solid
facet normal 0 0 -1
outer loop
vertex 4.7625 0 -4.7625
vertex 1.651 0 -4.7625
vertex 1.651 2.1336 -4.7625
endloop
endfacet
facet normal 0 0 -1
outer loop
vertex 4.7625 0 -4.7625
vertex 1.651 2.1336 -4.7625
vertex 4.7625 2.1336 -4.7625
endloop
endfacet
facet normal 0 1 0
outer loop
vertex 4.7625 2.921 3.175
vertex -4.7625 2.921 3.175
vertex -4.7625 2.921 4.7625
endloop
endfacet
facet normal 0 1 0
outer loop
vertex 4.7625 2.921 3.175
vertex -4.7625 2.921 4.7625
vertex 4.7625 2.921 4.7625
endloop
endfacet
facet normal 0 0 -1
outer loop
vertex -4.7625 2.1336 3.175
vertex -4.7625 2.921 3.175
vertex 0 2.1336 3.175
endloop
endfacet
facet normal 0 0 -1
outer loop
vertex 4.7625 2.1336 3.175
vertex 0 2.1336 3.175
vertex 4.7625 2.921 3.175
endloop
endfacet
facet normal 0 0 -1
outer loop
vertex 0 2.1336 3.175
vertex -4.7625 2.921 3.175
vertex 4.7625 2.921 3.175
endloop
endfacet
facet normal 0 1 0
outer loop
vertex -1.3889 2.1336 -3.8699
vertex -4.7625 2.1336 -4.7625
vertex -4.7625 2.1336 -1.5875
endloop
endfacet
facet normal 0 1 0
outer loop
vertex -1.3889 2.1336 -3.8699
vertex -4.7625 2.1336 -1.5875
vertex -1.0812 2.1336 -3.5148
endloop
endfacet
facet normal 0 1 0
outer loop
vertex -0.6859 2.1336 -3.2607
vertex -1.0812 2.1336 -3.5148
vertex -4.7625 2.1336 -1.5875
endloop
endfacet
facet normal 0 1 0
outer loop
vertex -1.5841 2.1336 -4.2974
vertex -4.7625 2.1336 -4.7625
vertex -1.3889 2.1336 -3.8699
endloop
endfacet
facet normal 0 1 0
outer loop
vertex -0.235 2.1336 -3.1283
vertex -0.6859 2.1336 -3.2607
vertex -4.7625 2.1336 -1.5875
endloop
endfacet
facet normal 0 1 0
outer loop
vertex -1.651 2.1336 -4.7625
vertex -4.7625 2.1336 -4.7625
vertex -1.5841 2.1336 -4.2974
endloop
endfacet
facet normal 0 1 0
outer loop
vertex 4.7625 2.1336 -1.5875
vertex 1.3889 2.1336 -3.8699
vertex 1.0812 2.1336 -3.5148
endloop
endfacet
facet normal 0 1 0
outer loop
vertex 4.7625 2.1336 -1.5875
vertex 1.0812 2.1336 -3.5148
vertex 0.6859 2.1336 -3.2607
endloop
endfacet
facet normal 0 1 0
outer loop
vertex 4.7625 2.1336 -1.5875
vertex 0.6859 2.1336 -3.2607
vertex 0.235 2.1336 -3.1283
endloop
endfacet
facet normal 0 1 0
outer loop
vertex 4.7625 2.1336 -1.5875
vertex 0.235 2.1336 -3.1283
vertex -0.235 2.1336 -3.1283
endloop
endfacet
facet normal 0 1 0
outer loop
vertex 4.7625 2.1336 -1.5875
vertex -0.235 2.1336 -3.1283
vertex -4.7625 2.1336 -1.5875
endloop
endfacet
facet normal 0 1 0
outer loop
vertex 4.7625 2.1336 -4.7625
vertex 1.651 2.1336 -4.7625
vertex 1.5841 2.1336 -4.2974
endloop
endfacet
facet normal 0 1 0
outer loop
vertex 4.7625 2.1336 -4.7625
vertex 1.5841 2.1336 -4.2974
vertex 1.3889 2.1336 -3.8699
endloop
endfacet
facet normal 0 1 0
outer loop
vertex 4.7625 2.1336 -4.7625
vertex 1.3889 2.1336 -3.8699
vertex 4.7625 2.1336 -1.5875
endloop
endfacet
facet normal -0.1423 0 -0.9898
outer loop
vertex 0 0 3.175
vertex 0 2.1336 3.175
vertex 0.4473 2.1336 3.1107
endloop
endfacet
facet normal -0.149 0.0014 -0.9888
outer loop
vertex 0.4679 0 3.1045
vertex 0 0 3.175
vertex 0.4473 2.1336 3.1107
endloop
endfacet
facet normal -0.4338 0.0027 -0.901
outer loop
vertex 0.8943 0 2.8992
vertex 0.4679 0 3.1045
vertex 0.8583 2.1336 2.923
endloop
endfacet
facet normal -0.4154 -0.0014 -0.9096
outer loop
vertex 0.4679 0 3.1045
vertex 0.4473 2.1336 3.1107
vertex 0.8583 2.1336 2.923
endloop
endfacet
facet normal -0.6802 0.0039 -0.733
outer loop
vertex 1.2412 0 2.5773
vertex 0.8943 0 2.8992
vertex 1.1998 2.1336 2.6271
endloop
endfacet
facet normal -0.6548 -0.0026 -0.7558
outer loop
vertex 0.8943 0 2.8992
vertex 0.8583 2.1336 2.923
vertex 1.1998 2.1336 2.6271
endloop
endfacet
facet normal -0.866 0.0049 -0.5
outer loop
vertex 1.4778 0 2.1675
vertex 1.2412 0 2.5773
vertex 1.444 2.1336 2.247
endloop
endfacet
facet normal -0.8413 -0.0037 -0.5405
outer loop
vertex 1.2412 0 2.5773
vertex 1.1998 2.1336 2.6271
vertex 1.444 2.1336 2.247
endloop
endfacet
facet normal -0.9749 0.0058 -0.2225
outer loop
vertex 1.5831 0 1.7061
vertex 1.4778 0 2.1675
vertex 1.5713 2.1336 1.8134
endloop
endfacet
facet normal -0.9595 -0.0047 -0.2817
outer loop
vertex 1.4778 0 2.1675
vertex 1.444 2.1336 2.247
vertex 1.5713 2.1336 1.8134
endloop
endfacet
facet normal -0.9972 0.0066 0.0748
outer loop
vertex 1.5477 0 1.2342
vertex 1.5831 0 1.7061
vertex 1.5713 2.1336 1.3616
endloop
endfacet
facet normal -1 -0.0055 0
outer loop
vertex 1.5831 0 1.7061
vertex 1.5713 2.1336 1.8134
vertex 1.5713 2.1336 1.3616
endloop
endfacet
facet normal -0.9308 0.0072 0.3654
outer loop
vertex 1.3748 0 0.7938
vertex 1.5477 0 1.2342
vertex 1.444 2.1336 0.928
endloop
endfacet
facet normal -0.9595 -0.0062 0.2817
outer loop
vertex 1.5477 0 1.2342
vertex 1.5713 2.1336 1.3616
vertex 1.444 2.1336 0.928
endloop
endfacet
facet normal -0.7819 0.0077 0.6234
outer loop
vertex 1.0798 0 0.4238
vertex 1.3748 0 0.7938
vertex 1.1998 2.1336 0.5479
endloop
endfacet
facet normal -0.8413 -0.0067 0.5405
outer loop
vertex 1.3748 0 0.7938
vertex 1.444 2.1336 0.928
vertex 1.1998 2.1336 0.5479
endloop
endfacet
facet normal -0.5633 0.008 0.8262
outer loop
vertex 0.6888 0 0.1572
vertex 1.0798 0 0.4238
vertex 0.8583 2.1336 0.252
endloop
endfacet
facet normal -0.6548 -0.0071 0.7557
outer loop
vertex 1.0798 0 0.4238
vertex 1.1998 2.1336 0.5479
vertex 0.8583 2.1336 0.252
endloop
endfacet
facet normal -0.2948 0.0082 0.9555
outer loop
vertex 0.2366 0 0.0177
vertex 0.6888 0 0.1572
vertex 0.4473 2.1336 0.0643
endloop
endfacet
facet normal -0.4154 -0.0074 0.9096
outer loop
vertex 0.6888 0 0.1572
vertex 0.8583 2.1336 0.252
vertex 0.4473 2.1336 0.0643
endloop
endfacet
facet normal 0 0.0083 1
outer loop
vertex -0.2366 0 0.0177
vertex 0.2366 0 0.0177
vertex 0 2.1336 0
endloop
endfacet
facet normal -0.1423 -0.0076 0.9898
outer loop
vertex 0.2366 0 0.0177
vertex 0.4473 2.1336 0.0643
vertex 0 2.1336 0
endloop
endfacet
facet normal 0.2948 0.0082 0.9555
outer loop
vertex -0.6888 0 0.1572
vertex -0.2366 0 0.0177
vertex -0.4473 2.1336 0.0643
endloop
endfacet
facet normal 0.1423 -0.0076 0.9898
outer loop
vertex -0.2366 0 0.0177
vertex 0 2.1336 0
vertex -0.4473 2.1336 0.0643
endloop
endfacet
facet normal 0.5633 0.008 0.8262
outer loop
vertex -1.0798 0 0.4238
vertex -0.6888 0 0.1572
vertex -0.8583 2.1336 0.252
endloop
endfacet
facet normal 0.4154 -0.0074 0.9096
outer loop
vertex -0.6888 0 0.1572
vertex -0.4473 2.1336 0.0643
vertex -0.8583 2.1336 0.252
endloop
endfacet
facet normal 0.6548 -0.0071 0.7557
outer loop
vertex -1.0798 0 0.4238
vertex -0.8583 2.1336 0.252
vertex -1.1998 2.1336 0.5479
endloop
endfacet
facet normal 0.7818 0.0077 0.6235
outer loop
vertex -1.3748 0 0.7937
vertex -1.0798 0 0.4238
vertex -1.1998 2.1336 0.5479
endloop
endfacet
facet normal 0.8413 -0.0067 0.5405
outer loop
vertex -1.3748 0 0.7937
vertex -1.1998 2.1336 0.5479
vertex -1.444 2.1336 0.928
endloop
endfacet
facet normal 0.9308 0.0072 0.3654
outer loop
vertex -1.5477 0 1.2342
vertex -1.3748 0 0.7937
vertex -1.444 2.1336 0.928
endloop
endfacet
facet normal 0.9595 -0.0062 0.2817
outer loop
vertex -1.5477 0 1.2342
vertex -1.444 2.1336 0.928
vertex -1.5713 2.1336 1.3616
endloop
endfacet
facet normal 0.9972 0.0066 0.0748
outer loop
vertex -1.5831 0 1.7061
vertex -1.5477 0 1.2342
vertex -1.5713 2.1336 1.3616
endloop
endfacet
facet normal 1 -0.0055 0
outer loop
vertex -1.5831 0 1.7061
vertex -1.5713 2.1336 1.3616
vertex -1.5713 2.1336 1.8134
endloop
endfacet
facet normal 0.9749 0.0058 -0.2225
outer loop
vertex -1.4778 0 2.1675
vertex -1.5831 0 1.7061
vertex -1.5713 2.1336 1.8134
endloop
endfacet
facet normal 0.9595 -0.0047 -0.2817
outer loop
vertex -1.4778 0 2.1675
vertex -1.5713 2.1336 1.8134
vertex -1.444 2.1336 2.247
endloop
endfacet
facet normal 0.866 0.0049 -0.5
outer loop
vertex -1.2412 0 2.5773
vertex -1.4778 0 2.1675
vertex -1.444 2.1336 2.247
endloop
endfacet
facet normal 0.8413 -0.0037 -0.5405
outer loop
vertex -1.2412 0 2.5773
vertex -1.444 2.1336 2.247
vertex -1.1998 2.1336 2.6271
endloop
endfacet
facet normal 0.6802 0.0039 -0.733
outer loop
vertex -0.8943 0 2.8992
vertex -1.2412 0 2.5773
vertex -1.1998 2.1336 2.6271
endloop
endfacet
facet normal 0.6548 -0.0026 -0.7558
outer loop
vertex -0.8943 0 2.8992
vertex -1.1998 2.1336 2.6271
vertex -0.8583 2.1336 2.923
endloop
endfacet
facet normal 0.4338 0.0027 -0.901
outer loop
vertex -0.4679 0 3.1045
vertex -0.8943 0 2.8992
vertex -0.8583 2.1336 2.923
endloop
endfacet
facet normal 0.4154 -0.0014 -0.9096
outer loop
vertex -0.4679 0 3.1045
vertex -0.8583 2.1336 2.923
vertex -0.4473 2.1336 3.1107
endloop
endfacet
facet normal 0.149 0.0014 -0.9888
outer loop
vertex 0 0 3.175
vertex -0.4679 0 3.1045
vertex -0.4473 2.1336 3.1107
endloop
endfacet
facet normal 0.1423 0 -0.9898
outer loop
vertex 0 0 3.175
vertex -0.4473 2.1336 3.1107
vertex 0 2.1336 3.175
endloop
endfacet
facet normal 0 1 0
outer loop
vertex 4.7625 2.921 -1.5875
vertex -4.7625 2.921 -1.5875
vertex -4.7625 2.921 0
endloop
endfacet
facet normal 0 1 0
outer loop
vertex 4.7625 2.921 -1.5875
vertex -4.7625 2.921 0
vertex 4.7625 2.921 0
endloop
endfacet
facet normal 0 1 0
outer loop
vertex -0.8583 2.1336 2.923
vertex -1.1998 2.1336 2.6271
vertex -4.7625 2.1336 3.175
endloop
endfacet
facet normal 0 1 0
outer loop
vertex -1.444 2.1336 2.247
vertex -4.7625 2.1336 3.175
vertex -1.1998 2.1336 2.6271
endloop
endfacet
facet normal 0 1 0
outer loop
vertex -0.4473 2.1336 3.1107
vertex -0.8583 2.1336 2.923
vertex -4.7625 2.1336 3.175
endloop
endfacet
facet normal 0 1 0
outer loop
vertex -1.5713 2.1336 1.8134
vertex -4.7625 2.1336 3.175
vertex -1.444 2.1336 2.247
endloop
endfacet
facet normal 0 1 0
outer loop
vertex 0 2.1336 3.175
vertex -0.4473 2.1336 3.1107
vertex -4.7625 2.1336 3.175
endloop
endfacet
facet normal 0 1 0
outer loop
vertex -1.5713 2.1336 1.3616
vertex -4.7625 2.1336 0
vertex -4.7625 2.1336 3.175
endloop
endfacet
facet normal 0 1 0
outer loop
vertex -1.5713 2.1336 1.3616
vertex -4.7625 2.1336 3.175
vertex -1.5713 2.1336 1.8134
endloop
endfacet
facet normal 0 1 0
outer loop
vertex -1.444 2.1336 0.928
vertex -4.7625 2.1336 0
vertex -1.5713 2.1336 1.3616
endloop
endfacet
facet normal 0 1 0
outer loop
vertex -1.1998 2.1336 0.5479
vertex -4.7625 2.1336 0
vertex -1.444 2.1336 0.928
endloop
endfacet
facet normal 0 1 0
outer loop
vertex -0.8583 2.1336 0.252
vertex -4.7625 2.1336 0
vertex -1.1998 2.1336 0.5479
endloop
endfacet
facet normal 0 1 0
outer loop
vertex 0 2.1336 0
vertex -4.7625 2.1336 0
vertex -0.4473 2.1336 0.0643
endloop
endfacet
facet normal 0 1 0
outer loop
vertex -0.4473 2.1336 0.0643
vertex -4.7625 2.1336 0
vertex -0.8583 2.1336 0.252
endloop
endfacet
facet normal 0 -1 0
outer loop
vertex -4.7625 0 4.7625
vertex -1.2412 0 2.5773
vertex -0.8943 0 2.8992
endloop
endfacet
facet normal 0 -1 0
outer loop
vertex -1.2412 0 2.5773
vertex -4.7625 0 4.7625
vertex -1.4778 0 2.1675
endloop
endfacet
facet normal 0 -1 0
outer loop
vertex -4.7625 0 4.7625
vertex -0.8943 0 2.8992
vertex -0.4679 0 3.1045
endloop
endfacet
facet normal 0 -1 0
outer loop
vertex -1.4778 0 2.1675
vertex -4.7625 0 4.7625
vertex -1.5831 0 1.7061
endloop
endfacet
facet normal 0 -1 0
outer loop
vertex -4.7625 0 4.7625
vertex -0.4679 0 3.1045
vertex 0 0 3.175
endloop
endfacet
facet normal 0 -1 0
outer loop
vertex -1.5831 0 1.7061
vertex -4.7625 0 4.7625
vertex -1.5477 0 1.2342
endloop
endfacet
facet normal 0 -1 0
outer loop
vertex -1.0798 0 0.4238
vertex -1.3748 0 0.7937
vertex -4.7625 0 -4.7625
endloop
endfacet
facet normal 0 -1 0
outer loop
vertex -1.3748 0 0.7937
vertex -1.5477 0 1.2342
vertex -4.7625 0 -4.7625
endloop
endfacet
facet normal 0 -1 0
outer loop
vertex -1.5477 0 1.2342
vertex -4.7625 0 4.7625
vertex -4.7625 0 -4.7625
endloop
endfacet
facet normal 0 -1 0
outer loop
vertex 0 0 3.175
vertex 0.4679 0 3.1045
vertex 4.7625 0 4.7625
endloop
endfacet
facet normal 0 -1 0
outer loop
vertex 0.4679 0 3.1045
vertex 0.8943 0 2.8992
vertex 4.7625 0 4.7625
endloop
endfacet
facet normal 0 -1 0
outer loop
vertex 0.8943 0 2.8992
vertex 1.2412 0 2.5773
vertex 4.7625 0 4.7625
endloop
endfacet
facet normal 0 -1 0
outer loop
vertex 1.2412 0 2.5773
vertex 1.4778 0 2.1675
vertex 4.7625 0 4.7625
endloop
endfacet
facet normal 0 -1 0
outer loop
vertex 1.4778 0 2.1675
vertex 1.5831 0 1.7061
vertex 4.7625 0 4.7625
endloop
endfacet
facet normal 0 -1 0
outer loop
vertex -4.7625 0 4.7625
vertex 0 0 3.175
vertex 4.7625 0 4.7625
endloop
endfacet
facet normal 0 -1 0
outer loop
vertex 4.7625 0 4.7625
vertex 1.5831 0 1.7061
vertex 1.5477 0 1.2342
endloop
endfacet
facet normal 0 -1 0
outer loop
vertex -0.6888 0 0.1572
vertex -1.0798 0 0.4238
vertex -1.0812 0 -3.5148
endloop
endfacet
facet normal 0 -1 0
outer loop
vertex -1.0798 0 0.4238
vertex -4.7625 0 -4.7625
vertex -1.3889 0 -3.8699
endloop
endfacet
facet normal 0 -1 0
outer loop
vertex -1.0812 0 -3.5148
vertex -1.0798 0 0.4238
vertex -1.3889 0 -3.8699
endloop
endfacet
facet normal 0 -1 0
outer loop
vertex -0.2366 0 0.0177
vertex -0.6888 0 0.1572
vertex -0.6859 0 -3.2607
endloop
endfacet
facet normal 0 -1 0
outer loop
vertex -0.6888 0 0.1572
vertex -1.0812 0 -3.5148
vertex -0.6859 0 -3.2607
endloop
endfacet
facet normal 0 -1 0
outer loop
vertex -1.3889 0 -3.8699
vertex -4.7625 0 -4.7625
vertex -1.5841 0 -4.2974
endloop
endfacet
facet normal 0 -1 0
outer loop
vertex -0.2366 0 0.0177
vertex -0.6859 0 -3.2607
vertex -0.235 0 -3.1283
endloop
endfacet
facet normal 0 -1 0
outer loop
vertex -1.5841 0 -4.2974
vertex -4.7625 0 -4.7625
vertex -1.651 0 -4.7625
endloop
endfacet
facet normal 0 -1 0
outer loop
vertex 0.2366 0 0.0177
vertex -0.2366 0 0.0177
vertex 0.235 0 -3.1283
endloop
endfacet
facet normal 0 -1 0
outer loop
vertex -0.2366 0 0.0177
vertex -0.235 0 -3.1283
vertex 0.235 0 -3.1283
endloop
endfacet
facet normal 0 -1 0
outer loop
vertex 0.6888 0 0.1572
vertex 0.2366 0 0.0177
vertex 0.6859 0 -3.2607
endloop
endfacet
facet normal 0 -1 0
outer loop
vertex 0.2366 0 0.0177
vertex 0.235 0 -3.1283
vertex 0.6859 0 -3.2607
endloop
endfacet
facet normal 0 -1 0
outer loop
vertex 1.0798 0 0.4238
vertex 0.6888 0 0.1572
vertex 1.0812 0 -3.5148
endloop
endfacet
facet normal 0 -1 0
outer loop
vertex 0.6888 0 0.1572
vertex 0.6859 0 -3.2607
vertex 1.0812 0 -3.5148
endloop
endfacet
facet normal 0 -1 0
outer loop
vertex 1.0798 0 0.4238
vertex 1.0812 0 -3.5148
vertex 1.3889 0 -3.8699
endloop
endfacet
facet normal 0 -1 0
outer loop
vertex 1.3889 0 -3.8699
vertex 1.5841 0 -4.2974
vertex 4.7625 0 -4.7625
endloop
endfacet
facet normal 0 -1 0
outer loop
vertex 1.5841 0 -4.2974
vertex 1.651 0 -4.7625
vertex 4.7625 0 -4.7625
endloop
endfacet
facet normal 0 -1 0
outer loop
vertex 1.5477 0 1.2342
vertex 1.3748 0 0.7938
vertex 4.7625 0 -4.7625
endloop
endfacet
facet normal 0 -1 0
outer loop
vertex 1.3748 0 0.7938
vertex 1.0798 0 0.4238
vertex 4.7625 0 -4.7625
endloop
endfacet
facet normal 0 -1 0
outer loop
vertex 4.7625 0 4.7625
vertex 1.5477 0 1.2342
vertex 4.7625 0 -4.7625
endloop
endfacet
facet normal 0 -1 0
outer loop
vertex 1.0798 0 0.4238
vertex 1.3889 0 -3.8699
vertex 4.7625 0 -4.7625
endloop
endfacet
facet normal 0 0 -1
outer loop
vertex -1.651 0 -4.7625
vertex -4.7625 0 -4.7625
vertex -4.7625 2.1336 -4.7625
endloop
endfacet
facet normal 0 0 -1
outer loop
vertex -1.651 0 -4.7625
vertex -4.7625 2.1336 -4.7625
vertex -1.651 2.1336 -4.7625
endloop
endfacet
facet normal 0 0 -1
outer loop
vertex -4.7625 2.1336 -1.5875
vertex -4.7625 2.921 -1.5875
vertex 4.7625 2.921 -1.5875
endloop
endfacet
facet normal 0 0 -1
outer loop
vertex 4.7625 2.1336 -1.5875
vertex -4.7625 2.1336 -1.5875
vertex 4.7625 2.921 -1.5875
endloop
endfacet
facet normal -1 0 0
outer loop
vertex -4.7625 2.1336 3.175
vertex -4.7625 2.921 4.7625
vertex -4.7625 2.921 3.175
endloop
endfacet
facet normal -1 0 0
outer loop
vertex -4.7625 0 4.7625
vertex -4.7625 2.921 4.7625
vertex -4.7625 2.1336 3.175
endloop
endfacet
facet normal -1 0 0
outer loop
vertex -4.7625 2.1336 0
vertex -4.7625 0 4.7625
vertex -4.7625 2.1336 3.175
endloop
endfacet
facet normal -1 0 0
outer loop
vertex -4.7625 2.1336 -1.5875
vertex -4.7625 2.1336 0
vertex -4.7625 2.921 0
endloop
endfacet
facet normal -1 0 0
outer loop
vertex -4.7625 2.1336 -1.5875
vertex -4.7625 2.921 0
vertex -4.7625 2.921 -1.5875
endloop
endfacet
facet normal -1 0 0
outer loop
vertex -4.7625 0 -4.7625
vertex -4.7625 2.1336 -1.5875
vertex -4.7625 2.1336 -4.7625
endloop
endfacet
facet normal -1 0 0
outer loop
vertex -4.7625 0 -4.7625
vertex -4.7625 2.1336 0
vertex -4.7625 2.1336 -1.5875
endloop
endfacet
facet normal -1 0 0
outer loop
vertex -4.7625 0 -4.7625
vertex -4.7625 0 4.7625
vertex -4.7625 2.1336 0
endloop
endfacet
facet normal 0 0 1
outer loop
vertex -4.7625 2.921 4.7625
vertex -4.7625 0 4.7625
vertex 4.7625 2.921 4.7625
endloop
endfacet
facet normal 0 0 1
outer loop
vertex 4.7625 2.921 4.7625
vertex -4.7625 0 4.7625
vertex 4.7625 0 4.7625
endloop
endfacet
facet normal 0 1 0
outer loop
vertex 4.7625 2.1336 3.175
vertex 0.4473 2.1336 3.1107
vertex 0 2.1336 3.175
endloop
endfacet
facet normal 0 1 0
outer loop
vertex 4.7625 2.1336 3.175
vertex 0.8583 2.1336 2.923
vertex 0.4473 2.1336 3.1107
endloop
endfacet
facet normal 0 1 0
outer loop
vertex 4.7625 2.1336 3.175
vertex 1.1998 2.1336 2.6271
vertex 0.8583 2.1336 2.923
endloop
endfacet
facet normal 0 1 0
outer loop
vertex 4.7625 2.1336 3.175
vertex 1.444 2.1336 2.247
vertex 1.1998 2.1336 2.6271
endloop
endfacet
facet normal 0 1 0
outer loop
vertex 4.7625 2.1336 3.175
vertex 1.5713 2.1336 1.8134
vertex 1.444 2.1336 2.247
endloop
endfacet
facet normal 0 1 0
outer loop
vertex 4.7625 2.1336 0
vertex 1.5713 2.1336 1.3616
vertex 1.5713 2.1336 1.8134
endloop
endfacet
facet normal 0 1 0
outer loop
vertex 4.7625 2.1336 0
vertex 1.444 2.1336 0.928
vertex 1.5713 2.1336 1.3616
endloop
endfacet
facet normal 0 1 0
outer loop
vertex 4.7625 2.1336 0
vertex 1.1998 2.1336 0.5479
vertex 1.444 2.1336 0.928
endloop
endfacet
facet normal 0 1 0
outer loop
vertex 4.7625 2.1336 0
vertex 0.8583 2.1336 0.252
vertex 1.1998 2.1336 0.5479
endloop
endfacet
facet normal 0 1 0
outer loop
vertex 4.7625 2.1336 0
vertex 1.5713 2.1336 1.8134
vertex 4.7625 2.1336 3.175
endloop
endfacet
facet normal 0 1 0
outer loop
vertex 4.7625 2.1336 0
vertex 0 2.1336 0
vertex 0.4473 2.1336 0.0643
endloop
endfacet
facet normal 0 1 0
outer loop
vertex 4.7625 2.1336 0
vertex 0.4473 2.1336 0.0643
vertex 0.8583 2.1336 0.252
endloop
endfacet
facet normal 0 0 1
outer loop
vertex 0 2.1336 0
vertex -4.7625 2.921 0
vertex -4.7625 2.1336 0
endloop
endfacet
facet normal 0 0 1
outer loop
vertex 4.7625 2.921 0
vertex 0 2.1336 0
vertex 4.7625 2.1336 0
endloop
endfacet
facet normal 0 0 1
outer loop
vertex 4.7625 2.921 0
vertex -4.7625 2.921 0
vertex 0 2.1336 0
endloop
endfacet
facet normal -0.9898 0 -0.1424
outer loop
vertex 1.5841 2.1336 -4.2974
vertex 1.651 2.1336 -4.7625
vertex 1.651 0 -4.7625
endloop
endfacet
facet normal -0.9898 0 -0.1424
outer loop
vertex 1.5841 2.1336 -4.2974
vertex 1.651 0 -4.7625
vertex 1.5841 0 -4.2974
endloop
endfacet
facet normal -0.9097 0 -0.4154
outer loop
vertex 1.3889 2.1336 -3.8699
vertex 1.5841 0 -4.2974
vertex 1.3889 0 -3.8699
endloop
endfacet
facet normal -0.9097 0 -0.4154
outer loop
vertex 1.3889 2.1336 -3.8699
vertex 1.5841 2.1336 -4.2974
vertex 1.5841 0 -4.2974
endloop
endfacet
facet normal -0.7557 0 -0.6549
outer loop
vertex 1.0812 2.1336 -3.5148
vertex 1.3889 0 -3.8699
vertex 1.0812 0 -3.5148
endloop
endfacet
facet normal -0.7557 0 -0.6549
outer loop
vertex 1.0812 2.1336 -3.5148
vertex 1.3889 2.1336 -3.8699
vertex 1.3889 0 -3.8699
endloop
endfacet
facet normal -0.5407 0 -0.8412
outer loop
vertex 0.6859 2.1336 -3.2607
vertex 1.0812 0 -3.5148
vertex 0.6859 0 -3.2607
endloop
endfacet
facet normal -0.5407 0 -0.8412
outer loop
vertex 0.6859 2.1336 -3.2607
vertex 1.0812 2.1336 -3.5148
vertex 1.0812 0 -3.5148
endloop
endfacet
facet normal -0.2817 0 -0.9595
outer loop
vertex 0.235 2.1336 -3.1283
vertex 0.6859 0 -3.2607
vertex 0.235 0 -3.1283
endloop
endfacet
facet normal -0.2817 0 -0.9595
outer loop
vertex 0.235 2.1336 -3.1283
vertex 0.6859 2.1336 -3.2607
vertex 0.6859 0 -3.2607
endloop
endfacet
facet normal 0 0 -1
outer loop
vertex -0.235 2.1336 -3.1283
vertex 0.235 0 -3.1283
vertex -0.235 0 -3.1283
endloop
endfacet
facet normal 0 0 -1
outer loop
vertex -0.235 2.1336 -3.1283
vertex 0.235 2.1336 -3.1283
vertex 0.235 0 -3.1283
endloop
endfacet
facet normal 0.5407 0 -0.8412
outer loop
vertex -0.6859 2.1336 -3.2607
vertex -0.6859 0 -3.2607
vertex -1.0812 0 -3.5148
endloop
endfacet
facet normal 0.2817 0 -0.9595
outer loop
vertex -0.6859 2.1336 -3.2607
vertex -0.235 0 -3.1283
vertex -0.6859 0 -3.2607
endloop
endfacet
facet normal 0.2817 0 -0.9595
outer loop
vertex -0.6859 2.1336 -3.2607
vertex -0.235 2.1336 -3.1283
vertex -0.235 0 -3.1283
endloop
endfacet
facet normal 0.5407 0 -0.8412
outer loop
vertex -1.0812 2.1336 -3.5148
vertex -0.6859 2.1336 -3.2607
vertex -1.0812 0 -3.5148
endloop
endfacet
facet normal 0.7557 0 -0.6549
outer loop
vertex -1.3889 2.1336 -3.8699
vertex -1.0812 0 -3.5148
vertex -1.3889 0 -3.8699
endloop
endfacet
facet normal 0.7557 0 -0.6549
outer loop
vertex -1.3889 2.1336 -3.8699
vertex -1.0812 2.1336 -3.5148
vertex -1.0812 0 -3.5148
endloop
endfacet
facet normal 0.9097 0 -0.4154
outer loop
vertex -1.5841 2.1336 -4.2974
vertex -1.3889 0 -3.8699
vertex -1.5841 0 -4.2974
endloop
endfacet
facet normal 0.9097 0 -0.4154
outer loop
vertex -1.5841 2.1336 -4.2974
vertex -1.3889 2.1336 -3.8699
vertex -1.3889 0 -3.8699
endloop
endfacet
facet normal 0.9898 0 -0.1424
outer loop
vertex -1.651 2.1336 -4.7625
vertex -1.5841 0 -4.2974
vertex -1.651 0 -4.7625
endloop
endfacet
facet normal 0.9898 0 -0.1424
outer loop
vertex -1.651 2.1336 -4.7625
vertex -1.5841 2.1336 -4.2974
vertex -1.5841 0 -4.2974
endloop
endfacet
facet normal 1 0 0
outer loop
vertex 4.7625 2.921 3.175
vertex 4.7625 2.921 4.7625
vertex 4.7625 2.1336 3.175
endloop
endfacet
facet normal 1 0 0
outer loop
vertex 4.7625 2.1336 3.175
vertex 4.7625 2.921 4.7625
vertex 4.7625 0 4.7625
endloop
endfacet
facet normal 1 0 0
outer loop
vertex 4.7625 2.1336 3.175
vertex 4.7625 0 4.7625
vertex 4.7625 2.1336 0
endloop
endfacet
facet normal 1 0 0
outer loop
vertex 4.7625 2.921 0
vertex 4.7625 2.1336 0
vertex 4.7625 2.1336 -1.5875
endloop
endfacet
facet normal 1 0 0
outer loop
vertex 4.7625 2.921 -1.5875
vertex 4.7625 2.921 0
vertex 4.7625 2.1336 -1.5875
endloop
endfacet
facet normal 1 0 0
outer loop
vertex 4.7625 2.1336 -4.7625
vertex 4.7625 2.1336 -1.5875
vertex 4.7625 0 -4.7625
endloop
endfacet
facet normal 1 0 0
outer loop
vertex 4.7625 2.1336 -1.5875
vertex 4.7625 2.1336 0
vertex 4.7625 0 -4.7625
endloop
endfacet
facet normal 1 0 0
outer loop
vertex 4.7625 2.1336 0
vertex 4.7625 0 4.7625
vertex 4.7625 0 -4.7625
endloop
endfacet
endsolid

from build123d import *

# Parameters (mm, degrees)
SKETCH1_W           = 9.525
SKETCH1_H           = 9.525
BOSS_EXTRUDE1_DEPTH = 2.921
SKETCH2_W           = 9.525
SKETCH2_H           = 3.175
CUT_EXTRUDE1_DEPTH  = 0.7874
SKETCH3_R           = 1.5875
CUT_EXTRUDE2_DEPTH  = 8.065059197


with BuildPart() as part:
    # Sketch1 → Boss-Extrude1 (new body)
    with BuildSketch(Plane(origin=(0, 0, 0), x_dir=(1, 0, 0), z_dir=(0, 1, 0))):
        Rectangle(SKETCH1_W, SKETCH1_H)
    extrude(amount=BOSS_EXTRUDE1_DEPTH)

    # Sketch2 → Cut-Extrude1 (cut)
    with BuildSketch(Plane(origin=(0, 2.921, 0), x_dir=(1, 0, 0), z_dir=(0, 1, 0))):
        with Locations((0, -1.5875)):
            Rectangle(SKETCH2_W, SKETCH2_H)
        with Locations((0, 3.175)):
            Rectangle(SKETCH2_W, SKETCH2_H)
    extrude(amount=-CUT_EXTRUDE1_DEPTH, mode=Mode.SUBTRACT)

    # Sketch3 → Cut-Extrude2 (cut, through all)
    with BuildSketch(Plane(origin=(0, 2.1336, 0), x_dir=(1, 0, 0), z_dir=(0, 1, 0))):
        with Locations(Location((0, -1.5875, 0), (0, 0, 270))):
            Circle(SKETCH3_R)
        with BuildLine():
            Line((-1.651, 4.7625), (1.651, 4.7625))
            ThreePointArc((1.651, 4.7625), (0, 3.1115), (-1.651, 4.7625))
        make_face()
    extrude(amount=-CUT_EXTRUDE2_DEPTH, mode=Mode.SUBTRACT)


solid = part.part
